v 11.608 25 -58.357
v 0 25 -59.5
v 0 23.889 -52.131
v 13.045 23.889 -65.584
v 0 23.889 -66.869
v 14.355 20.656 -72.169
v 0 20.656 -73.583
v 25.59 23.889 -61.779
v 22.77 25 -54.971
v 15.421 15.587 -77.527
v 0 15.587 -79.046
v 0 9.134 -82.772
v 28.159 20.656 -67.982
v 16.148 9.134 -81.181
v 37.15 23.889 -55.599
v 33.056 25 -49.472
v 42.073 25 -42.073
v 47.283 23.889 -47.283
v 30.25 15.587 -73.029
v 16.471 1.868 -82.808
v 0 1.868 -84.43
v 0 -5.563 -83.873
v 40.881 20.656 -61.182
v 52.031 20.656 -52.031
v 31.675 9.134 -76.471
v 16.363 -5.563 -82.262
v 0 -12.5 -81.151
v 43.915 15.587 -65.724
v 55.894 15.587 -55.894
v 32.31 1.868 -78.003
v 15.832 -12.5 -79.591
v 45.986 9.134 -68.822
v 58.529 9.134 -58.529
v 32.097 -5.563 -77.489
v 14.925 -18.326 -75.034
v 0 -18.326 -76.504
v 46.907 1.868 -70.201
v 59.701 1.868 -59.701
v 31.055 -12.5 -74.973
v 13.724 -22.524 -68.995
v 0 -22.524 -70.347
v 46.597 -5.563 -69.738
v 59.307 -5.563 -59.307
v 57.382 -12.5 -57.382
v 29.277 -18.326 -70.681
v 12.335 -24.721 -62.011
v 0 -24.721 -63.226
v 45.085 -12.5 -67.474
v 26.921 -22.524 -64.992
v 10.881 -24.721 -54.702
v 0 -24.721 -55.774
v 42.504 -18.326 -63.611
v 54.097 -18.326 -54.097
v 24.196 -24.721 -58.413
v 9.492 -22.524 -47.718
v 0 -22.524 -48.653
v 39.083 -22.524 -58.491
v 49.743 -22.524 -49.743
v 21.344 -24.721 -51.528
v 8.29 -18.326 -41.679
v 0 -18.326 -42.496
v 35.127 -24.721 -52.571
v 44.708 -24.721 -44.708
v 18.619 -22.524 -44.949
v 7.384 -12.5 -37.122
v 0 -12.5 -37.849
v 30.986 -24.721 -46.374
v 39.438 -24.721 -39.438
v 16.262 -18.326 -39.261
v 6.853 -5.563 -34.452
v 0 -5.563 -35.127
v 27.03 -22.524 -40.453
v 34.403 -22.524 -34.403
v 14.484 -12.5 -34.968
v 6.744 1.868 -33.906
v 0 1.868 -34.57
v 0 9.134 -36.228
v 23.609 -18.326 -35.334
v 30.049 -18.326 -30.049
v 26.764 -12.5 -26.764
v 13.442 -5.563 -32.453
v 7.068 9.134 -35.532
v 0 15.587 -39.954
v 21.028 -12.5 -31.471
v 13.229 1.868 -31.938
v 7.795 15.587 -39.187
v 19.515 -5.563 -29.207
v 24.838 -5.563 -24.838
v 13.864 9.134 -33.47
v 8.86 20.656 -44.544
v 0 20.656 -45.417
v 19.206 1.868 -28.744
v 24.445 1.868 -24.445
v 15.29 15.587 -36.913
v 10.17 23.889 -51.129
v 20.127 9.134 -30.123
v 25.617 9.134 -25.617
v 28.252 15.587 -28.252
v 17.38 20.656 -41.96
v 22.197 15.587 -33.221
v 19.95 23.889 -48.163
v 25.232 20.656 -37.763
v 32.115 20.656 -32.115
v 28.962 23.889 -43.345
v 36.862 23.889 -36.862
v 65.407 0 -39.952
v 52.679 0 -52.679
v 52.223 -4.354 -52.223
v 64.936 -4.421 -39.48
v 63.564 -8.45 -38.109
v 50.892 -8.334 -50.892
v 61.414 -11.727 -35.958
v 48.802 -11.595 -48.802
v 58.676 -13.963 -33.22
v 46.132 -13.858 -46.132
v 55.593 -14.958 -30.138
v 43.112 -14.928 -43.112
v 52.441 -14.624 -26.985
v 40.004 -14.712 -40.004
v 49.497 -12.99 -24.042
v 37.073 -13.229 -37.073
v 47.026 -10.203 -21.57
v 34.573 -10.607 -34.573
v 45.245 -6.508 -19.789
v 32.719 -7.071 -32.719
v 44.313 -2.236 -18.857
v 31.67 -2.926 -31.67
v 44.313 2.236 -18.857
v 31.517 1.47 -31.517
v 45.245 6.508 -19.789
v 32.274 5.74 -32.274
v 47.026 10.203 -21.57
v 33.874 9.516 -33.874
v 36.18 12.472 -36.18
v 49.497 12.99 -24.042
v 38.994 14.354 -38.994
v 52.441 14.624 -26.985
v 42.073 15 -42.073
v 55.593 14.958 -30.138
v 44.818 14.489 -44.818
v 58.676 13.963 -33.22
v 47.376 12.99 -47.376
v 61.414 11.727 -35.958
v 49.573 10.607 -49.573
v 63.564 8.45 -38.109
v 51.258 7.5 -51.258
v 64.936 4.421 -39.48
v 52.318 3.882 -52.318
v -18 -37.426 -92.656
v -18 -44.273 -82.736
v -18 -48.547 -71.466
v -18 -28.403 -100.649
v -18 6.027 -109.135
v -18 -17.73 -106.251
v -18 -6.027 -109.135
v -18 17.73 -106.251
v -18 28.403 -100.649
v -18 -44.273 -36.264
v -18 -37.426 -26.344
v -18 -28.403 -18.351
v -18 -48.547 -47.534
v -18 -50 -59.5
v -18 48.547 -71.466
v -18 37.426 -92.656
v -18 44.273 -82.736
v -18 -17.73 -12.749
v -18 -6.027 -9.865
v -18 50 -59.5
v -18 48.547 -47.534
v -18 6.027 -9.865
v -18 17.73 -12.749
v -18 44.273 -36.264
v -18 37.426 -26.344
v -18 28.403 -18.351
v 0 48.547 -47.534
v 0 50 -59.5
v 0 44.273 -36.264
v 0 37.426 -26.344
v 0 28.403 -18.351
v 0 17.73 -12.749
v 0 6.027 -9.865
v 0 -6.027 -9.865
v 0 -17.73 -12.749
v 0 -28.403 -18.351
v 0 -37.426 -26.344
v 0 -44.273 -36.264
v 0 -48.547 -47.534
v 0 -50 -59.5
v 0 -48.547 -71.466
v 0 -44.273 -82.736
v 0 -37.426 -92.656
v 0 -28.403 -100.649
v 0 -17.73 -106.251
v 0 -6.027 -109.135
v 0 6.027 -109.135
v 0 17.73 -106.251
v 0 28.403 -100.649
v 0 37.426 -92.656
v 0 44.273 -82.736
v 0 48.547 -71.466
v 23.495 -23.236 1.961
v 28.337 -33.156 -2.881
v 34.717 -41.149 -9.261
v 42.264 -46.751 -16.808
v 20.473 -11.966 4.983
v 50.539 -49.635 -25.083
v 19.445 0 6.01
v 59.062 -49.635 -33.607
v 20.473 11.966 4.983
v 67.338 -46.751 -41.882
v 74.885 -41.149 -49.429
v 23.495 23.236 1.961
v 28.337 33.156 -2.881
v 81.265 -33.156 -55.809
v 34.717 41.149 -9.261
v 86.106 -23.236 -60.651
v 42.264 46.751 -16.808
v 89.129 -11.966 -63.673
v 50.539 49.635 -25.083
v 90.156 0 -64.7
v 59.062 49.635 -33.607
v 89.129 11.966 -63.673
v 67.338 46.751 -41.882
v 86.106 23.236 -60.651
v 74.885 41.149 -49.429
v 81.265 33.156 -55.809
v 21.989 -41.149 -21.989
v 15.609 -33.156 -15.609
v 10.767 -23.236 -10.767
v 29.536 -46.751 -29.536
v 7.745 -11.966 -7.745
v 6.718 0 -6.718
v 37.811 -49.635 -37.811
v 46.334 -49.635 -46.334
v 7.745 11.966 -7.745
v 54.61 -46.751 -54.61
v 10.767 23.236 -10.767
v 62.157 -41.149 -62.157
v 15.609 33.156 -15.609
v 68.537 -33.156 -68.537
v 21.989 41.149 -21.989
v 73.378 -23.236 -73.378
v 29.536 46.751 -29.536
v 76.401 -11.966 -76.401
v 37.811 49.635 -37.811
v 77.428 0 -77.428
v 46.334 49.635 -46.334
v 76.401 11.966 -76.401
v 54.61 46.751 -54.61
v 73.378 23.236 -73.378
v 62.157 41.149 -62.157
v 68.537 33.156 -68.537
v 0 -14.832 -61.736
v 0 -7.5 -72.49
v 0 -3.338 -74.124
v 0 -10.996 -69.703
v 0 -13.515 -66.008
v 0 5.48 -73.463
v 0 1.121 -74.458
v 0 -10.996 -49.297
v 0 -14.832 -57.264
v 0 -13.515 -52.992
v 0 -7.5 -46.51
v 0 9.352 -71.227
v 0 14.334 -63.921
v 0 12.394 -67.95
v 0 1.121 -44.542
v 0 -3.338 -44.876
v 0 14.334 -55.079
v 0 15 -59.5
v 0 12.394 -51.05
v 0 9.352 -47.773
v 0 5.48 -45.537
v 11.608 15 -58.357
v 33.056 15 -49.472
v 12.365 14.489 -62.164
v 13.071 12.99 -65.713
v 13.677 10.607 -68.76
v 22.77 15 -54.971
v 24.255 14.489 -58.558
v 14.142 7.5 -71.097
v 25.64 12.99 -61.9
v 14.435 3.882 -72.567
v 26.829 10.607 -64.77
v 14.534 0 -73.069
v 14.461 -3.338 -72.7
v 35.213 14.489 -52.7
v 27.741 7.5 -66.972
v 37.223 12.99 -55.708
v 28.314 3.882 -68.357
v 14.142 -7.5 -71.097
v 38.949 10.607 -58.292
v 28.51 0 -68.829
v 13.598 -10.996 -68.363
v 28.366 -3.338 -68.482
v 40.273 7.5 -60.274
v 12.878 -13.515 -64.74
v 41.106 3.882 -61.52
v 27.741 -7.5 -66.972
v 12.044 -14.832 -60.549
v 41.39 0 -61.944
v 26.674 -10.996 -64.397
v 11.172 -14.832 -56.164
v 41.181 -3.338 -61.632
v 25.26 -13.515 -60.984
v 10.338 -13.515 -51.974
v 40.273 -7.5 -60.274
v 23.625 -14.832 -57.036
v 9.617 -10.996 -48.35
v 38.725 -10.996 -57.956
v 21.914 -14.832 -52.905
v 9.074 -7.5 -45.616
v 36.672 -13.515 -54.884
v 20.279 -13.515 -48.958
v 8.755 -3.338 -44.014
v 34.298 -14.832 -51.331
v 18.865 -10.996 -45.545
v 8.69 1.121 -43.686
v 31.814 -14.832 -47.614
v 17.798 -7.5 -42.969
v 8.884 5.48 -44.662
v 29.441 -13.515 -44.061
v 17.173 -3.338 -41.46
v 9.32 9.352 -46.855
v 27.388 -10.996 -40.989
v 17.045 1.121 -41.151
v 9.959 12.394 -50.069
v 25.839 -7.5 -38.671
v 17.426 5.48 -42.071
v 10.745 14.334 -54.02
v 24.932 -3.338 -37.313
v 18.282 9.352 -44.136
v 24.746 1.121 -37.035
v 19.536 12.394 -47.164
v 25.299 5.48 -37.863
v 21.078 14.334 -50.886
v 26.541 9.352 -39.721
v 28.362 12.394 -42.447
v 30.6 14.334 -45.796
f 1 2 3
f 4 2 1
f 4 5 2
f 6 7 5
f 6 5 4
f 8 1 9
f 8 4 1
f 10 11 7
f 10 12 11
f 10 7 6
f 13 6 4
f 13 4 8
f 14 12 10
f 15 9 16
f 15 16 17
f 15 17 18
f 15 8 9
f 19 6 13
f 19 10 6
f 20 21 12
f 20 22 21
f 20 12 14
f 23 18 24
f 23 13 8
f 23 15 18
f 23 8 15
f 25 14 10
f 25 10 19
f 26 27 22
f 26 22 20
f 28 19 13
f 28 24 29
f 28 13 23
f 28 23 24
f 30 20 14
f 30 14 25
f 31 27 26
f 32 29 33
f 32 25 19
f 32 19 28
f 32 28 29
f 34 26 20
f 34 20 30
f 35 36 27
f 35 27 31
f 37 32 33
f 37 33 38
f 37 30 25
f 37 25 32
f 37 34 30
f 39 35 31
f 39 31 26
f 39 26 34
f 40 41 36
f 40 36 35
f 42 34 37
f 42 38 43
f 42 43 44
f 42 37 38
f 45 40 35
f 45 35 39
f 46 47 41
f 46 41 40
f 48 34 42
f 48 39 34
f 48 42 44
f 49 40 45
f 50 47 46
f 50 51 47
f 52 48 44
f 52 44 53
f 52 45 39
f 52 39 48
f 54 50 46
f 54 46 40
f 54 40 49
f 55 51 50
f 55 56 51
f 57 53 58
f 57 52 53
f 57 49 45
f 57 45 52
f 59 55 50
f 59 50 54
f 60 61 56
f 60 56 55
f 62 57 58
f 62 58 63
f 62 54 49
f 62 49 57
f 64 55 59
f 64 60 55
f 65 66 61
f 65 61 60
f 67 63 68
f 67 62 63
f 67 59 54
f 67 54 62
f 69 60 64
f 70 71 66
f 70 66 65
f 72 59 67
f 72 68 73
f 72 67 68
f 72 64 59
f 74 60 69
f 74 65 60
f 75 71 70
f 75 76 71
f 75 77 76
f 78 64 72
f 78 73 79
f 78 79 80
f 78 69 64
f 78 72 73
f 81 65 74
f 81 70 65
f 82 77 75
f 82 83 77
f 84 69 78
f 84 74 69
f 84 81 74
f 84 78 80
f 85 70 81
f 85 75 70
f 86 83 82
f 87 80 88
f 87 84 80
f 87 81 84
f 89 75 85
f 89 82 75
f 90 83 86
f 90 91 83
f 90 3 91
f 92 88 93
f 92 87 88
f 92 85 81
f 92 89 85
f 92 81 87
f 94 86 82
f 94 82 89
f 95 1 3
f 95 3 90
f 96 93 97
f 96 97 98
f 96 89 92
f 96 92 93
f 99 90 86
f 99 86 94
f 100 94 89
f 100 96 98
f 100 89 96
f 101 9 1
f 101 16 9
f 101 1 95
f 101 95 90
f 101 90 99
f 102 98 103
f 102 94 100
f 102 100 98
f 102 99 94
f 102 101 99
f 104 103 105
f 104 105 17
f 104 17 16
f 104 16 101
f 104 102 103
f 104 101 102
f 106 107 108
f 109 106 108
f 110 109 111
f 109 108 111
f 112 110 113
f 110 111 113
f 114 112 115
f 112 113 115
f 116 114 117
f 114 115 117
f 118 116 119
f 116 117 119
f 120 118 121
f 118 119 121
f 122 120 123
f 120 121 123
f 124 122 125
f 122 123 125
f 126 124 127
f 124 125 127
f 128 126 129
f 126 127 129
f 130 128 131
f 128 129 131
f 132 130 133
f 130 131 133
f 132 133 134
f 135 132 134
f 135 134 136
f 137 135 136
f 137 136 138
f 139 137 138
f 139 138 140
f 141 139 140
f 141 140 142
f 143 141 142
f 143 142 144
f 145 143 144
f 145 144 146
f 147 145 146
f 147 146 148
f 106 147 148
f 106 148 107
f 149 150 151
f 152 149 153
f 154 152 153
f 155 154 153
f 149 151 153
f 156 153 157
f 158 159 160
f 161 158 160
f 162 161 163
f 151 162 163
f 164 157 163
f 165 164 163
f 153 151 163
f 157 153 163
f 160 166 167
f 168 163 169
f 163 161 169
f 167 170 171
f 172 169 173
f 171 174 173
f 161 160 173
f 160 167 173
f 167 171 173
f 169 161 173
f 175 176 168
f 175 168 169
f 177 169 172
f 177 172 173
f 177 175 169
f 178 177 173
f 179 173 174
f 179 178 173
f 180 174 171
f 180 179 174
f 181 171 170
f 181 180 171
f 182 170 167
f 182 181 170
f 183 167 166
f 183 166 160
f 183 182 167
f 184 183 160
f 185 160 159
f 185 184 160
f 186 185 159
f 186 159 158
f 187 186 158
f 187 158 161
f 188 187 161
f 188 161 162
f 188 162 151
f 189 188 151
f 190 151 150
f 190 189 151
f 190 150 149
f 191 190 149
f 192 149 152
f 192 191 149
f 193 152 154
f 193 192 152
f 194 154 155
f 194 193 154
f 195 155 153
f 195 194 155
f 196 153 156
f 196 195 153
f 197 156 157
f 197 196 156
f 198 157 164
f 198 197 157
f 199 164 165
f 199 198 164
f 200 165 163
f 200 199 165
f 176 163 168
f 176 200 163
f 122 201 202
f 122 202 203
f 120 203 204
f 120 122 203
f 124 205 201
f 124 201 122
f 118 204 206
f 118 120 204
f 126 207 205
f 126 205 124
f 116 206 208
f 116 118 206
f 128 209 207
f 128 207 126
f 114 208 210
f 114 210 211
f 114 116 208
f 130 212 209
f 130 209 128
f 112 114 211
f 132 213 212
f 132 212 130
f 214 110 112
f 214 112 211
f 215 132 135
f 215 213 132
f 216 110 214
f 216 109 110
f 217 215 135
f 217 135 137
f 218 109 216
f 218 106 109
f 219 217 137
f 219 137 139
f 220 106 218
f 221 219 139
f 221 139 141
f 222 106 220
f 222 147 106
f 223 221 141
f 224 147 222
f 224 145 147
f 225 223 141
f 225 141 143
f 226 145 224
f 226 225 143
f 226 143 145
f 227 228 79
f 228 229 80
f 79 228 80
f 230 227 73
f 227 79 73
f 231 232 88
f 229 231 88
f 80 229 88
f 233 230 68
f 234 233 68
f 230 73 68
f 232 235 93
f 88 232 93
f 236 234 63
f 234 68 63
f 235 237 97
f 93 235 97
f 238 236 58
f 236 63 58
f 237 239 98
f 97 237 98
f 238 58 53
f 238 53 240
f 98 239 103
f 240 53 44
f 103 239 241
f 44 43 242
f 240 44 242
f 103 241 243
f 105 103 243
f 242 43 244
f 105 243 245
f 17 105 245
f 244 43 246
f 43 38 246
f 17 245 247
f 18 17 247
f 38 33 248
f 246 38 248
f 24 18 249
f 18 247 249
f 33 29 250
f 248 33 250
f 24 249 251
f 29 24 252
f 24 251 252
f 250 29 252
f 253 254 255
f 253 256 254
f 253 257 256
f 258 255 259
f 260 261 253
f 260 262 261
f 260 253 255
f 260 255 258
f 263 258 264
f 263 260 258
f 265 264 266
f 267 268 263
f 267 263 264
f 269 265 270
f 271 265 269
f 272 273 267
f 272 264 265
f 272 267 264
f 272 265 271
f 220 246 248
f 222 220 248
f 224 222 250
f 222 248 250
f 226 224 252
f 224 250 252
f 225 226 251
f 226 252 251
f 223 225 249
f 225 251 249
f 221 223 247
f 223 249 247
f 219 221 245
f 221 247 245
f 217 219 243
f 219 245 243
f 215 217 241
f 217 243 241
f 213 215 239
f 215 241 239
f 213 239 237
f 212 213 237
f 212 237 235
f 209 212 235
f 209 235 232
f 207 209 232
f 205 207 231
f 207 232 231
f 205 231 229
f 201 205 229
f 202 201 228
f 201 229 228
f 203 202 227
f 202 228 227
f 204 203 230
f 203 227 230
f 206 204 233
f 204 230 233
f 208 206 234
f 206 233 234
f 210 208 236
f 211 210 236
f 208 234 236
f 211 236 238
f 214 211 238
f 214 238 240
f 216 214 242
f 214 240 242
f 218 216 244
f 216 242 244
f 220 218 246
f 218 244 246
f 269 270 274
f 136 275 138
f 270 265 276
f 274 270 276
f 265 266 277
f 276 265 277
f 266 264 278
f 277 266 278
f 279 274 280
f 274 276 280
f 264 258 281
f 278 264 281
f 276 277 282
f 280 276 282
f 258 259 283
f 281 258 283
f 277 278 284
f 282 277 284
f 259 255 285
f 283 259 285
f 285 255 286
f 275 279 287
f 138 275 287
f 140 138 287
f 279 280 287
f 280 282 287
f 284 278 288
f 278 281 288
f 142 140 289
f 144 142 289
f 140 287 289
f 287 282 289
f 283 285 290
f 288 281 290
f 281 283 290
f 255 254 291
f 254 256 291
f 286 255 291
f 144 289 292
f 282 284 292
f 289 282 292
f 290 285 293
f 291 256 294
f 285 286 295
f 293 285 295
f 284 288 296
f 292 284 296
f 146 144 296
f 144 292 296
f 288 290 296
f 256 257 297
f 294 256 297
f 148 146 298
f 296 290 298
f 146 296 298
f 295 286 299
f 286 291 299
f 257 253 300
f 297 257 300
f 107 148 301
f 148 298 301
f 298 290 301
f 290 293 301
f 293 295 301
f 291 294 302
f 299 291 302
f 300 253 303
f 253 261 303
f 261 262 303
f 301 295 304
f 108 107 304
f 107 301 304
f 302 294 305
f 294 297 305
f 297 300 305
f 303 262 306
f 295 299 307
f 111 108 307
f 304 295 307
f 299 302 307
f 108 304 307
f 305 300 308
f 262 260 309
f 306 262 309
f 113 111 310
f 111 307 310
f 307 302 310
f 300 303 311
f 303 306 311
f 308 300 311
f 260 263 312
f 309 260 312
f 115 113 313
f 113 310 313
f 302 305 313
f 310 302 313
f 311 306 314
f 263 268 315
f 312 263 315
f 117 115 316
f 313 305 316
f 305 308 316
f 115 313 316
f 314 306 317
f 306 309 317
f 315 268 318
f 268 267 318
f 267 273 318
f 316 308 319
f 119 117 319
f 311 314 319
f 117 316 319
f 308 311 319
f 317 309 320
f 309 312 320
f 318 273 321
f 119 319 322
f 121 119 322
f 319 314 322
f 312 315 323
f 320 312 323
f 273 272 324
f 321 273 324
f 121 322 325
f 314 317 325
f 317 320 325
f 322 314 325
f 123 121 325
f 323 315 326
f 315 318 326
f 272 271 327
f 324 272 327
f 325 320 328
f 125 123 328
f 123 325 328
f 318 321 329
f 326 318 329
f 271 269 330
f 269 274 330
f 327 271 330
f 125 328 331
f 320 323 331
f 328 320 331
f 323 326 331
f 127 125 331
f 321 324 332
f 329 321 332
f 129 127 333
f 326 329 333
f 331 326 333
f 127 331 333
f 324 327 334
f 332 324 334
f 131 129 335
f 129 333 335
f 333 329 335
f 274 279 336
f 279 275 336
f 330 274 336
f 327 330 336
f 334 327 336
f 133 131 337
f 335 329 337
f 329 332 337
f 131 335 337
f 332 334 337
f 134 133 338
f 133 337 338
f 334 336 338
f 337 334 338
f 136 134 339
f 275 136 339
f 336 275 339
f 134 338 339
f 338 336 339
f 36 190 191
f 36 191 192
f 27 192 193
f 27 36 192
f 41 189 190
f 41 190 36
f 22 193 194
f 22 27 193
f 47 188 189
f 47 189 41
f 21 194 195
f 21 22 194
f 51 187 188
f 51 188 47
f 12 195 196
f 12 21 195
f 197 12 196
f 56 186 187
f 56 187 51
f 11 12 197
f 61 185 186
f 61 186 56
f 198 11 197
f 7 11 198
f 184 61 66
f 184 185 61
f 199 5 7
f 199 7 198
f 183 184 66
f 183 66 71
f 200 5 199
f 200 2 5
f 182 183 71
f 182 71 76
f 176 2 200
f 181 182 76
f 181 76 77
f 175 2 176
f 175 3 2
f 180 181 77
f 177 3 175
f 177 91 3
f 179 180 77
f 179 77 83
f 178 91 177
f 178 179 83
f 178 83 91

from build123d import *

# Parameters (mm, degrees)
F1_R     = 50
F1_R_2   = 25
F2_DEPTH = 18
F4_R     = 50
F5_DEPTH = 18


with BuildPart() as f2:
    # F1 (on Right) → F2 (new body)
    with BuildSketch(Plane.YZ):
        with Locations((0, -59.5)):
            Circle(F1_R)
        with Locations((0, -59.5)):
            Circle(F1_R_2, mode=Mode.SUBTRACT)
        with Locations((0, -59.5)):
            Circle(F1_R_2)
        with BuildLine():
            ThreePointArc((0, -44.5), (10.6066017178, -48.8933982822), (15, -59.5))
            ThreePointArc((15, -59.5), (-10.6066017178, -70.1066017178), (0, -44.5))
        make_face(mode=Mode.SUBTRACT)
        with BuildLine():
            ThreePointArc((0, -44.5), (-10.6066017178, -70.1066017178), (15, -59.5))
            ThreePointArc((15, -59.5), (10.6066017178, -48.8933982822), (0, -44.5))
        make_face()
    extrude(amount=-F2_DEPTH)

    # F3: sweep along a path in F0
    with BuildLine(Plane.XZ) as f3_path:
        ThreePointArc((0, -59.5), (22.7696642257, -54.9708321844), (42.0728534806, -42.0728534806))
    # F1 (on Right) → F3 (sweep)
    with BuildSketch(Plane.YZ):
        with Locations((0, -59.5)):
            Circle(F1_R_2)
        with BuildLine():
            ThreePointArc((0, -44.5), (10.6066017178, -48.8933982822), (15, -59.5))
            ThreePointArc((15, -59.5), (-10.6066017178, -70.1066017178), (0, -44.5))
        make_face(mode=Mode.SUBTRACT)
    sweep(path=f3_path.line)

    # F4 (on face) → F5 (join)
    with BuildSketch(Plane(origin=(0, 0, 0), x_dir=(0.7071067812, 0, -0.7071067812), z_dir=(0.7071067812, 0, 0.7071067812))):
        with Locations((59.5, 0)):
            Circle(F4_R)
        with BuildLine():
            ThreePointArc((59.5, 15), (70.1066017178, 10.6066017178), (74.5, 0))
            ThreePointArc((74.5, 0), (48.8933982822, -10.6066017178), (59.5, 15))
        make_face(mode=Mode.SUBTRACT)
    extrude(amount=F5_DEPTH)


solid = f2.part
